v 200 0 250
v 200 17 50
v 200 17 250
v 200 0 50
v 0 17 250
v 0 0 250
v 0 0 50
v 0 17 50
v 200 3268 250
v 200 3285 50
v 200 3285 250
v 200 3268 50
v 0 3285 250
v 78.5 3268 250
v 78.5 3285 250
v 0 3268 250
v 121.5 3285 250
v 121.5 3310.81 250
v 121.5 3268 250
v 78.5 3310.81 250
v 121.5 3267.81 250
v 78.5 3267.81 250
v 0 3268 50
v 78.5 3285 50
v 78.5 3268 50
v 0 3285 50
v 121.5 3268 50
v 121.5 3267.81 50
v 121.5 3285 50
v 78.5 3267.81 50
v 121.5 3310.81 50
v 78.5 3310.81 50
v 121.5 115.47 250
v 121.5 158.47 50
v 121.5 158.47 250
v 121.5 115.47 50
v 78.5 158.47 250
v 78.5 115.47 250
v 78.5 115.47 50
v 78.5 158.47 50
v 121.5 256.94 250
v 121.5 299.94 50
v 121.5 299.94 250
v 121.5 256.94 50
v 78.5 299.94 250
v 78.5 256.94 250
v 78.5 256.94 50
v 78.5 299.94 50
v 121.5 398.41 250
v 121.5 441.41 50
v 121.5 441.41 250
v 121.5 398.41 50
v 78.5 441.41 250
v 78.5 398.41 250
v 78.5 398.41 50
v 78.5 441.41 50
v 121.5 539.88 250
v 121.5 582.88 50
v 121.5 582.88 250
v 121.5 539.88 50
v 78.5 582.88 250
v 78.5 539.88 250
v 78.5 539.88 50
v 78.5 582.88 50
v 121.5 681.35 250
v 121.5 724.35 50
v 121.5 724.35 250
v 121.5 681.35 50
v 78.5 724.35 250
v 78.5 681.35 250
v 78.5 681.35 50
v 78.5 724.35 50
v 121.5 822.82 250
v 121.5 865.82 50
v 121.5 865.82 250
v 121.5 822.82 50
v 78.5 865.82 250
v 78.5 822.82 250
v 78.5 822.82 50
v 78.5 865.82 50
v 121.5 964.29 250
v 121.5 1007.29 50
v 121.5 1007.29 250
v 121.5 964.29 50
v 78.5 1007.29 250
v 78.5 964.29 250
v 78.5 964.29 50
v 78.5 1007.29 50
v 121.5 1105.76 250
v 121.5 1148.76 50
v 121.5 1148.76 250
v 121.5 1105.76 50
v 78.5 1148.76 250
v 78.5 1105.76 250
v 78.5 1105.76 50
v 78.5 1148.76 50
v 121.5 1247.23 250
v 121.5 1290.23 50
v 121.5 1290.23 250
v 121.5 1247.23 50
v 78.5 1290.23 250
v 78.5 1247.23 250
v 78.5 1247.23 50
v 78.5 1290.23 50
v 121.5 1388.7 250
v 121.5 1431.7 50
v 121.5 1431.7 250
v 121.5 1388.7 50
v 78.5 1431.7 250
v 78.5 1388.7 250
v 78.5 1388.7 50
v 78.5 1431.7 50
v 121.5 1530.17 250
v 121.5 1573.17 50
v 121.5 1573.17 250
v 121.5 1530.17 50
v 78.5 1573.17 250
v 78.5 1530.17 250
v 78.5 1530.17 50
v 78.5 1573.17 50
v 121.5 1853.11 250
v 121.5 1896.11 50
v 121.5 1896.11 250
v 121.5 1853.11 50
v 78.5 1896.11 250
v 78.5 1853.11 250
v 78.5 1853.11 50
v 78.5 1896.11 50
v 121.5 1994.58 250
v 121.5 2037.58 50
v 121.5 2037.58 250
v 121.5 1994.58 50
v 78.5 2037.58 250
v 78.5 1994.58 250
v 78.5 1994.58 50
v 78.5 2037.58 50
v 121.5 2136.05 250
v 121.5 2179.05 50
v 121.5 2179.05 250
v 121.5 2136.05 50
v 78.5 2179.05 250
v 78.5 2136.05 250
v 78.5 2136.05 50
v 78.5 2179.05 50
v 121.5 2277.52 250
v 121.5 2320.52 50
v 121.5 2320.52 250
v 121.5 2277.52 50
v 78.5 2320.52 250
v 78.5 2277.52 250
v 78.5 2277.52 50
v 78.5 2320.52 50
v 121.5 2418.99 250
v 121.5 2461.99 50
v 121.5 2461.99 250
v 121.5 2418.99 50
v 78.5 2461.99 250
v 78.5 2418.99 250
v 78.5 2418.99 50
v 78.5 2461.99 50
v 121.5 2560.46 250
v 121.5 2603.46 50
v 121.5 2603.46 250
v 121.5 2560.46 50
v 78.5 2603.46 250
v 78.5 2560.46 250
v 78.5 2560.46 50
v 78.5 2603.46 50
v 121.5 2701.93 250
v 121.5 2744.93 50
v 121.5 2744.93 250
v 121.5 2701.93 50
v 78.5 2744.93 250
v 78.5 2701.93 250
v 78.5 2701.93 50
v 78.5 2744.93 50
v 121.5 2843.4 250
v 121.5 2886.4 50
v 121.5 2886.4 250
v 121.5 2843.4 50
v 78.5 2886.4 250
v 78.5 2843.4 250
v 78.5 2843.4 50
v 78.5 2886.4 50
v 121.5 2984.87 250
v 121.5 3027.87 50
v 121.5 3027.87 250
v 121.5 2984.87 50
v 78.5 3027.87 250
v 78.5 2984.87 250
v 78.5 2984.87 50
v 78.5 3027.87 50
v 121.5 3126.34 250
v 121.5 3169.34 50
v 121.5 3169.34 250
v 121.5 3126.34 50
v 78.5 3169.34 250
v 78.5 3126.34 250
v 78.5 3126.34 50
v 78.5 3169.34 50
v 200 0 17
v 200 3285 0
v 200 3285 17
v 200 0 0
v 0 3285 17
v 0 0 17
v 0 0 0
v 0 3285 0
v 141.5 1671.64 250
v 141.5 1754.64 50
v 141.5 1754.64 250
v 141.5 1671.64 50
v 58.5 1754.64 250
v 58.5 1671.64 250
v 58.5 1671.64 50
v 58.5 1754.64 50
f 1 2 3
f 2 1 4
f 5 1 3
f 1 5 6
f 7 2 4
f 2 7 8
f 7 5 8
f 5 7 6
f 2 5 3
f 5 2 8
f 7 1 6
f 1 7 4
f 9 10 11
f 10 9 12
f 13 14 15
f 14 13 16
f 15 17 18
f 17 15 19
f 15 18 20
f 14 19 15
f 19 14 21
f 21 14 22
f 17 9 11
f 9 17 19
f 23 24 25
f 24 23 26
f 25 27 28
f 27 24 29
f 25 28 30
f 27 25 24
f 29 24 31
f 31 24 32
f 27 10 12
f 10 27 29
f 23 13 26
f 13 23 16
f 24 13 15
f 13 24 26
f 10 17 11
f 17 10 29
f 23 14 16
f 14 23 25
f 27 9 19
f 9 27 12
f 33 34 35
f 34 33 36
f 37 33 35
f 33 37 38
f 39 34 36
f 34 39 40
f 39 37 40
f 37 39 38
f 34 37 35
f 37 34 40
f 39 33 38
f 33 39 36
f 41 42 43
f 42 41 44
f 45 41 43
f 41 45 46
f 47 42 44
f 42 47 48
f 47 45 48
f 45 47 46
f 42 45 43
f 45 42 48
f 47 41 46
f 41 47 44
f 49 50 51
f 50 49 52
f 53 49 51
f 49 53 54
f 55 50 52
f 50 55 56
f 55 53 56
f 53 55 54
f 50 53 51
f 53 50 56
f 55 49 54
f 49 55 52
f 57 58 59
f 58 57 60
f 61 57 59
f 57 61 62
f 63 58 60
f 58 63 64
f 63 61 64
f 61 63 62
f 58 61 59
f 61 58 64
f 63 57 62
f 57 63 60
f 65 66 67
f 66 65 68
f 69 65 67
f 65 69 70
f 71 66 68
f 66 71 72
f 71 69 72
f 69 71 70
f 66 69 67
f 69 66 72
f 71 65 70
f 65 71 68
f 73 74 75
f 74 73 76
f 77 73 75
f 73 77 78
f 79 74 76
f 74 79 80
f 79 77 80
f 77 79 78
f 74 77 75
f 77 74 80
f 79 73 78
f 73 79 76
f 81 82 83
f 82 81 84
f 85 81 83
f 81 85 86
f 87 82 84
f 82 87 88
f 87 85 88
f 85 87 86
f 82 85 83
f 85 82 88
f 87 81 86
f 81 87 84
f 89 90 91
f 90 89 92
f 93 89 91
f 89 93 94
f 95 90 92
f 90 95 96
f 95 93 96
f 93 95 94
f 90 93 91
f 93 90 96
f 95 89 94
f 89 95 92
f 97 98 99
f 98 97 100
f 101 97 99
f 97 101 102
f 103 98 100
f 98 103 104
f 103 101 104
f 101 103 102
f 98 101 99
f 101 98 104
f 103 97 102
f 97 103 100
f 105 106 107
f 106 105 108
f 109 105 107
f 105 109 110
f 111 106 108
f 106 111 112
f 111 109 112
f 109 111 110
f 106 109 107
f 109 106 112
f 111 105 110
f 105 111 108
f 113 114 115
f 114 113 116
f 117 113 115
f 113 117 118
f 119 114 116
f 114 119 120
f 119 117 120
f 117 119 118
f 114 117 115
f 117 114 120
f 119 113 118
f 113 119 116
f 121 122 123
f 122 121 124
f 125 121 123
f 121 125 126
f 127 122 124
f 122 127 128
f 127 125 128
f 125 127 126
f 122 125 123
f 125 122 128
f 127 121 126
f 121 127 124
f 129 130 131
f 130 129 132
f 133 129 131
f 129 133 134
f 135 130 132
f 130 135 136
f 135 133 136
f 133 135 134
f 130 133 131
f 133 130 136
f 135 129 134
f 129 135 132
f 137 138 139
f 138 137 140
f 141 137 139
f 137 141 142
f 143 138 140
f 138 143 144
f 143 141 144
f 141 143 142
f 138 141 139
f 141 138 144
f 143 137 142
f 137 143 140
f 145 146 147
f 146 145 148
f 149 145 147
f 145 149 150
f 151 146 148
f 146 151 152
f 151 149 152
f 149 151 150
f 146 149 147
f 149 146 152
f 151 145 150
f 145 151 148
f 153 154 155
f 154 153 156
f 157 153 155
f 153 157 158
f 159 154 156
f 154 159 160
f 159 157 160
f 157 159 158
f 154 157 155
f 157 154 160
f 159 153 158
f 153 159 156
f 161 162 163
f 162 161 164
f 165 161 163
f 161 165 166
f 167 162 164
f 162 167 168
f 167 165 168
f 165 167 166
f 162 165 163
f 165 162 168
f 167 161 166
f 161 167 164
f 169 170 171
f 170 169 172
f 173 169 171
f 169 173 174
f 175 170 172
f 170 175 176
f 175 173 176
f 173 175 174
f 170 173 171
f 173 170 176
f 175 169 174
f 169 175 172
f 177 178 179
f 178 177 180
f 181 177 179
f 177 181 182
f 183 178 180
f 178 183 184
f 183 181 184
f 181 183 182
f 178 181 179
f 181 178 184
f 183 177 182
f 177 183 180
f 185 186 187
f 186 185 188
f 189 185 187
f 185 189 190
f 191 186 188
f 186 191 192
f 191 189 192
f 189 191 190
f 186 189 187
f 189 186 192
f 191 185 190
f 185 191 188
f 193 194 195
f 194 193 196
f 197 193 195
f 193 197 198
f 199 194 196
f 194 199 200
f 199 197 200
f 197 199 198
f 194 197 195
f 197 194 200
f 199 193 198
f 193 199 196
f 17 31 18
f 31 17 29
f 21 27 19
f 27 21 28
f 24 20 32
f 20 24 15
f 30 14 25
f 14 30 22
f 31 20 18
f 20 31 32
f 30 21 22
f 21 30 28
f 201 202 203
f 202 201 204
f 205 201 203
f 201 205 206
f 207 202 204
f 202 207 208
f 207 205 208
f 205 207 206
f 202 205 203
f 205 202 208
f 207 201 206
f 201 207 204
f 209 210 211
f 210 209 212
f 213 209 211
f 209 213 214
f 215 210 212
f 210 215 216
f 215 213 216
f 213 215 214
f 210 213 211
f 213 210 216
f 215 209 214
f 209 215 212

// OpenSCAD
// configure
bt = 43;
bt2 = 83;
bh = 1550;
fh = 1565;
fw = 3285;
fbw = 200;
fbt = 17;

// center => 1854.61
//l = 12;
//r = 10;
//dist = 98.47;

// center => 1713.14
l = 11;
r = 11;
dist = 98.47;

// center => 1777,91
//l = 12;
//r = 11;
//dist = 92.57;

cc = dist + bt;

// Trästolpar
module stick() {
    cube([bt, bt, 200], center = true);
}

module support() {
    cube([bt2, bt2, 200], center = true);
}

// Botten
cube([fbw, fw, fbt]);

// Kanter
if (true) {
    translate([0, 0, 50])
    union() {
        cube([fbw, fbt, 200]);
        translate([0, fw - fbt, 0]) cube([fbw, fbt, 200]);
    }
}

// Koordinater
ls = [for (i = [0:l - 1])
      fbt + dist + bt/2 +  i*(dist + bt)];
last = ls[l - 1];
center = last + dist + bt/2 + bt2/2;
rs = [for (i = [0:r-1])
      center + bt2/2 + dist + bt/2 + i*(dist + bt)];

// Skriv ut koordinater
echo("vänster/höger", l, r - 1);
echo("vänster", ls);
echo(last);
echo("center", center);
echo("höger", rs);
echo("5x7", 3*cc + bt);
echo("9x5", 6*cc + bt);

// Rendera
for (i = ls)
    translate([fbw/2, i, 150])
    stick();

translate([fbw/2, center, 150])
support();

for (i = rs)
    translate([fbw/2, i, 150])
    stick();
